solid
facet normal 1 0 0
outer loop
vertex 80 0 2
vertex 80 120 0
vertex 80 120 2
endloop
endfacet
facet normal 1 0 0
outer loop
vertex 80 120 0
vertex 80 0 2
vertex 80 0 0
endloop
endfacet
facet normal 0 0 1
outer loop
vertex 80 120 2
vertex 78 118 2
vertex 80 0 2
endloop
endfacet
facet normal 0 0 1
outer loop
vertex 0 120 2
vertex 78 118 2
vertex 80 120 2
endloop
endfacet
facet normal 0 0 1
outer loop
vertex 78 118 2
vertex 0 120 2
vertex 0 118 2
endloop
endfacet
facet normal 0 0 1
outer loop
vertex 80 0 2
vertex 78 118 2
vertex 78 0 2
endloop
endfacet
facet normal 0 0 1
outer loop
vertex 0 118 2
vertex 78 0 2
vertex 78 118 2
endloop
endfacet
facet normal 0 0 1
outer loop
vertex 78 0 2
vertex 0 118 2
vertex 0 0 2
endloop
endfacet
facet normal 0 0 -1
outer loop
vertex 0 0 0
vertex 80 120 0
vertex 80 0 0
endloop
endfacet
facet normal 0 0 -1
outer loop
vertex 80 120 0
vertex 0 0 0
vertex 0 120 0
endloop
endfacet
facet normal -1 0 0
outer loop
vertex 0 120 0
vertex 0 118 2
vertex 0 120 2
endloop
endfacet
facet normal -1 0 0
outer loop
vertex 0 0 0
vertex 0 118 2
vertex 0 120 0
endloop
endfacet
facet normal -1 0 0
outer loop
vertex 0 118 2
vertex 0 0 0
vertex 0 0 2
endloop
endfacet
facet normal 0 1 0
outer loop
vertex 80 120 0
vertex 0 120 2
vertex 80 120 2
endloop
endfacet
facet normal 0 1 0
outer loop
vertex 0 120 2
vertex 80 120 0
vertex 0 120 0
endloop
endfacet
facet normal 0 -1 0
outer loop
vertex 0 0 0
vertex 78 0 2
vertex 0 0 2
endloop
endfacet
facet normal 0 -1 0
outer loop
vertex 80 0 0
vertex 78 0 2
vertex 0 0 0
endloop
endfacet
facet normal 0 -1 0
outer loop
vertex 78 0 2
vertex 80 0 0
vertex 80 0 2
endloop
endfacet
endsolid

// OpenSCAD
// file: constants.scad
width = 80;
depth = 120;
height = 60;

thickness = 2;

legWidth = thickness / 2;
legDepth = 10;
legHeight = 10;
// main file
include <constants.scad>;

module lid() {
    difference() {
        cube([width, depth, thickness]);
        translate([0, 0, thickness]) {
            cube([width - thickness, depth - thickness, thickness]);
        }
    }
}

lid();
